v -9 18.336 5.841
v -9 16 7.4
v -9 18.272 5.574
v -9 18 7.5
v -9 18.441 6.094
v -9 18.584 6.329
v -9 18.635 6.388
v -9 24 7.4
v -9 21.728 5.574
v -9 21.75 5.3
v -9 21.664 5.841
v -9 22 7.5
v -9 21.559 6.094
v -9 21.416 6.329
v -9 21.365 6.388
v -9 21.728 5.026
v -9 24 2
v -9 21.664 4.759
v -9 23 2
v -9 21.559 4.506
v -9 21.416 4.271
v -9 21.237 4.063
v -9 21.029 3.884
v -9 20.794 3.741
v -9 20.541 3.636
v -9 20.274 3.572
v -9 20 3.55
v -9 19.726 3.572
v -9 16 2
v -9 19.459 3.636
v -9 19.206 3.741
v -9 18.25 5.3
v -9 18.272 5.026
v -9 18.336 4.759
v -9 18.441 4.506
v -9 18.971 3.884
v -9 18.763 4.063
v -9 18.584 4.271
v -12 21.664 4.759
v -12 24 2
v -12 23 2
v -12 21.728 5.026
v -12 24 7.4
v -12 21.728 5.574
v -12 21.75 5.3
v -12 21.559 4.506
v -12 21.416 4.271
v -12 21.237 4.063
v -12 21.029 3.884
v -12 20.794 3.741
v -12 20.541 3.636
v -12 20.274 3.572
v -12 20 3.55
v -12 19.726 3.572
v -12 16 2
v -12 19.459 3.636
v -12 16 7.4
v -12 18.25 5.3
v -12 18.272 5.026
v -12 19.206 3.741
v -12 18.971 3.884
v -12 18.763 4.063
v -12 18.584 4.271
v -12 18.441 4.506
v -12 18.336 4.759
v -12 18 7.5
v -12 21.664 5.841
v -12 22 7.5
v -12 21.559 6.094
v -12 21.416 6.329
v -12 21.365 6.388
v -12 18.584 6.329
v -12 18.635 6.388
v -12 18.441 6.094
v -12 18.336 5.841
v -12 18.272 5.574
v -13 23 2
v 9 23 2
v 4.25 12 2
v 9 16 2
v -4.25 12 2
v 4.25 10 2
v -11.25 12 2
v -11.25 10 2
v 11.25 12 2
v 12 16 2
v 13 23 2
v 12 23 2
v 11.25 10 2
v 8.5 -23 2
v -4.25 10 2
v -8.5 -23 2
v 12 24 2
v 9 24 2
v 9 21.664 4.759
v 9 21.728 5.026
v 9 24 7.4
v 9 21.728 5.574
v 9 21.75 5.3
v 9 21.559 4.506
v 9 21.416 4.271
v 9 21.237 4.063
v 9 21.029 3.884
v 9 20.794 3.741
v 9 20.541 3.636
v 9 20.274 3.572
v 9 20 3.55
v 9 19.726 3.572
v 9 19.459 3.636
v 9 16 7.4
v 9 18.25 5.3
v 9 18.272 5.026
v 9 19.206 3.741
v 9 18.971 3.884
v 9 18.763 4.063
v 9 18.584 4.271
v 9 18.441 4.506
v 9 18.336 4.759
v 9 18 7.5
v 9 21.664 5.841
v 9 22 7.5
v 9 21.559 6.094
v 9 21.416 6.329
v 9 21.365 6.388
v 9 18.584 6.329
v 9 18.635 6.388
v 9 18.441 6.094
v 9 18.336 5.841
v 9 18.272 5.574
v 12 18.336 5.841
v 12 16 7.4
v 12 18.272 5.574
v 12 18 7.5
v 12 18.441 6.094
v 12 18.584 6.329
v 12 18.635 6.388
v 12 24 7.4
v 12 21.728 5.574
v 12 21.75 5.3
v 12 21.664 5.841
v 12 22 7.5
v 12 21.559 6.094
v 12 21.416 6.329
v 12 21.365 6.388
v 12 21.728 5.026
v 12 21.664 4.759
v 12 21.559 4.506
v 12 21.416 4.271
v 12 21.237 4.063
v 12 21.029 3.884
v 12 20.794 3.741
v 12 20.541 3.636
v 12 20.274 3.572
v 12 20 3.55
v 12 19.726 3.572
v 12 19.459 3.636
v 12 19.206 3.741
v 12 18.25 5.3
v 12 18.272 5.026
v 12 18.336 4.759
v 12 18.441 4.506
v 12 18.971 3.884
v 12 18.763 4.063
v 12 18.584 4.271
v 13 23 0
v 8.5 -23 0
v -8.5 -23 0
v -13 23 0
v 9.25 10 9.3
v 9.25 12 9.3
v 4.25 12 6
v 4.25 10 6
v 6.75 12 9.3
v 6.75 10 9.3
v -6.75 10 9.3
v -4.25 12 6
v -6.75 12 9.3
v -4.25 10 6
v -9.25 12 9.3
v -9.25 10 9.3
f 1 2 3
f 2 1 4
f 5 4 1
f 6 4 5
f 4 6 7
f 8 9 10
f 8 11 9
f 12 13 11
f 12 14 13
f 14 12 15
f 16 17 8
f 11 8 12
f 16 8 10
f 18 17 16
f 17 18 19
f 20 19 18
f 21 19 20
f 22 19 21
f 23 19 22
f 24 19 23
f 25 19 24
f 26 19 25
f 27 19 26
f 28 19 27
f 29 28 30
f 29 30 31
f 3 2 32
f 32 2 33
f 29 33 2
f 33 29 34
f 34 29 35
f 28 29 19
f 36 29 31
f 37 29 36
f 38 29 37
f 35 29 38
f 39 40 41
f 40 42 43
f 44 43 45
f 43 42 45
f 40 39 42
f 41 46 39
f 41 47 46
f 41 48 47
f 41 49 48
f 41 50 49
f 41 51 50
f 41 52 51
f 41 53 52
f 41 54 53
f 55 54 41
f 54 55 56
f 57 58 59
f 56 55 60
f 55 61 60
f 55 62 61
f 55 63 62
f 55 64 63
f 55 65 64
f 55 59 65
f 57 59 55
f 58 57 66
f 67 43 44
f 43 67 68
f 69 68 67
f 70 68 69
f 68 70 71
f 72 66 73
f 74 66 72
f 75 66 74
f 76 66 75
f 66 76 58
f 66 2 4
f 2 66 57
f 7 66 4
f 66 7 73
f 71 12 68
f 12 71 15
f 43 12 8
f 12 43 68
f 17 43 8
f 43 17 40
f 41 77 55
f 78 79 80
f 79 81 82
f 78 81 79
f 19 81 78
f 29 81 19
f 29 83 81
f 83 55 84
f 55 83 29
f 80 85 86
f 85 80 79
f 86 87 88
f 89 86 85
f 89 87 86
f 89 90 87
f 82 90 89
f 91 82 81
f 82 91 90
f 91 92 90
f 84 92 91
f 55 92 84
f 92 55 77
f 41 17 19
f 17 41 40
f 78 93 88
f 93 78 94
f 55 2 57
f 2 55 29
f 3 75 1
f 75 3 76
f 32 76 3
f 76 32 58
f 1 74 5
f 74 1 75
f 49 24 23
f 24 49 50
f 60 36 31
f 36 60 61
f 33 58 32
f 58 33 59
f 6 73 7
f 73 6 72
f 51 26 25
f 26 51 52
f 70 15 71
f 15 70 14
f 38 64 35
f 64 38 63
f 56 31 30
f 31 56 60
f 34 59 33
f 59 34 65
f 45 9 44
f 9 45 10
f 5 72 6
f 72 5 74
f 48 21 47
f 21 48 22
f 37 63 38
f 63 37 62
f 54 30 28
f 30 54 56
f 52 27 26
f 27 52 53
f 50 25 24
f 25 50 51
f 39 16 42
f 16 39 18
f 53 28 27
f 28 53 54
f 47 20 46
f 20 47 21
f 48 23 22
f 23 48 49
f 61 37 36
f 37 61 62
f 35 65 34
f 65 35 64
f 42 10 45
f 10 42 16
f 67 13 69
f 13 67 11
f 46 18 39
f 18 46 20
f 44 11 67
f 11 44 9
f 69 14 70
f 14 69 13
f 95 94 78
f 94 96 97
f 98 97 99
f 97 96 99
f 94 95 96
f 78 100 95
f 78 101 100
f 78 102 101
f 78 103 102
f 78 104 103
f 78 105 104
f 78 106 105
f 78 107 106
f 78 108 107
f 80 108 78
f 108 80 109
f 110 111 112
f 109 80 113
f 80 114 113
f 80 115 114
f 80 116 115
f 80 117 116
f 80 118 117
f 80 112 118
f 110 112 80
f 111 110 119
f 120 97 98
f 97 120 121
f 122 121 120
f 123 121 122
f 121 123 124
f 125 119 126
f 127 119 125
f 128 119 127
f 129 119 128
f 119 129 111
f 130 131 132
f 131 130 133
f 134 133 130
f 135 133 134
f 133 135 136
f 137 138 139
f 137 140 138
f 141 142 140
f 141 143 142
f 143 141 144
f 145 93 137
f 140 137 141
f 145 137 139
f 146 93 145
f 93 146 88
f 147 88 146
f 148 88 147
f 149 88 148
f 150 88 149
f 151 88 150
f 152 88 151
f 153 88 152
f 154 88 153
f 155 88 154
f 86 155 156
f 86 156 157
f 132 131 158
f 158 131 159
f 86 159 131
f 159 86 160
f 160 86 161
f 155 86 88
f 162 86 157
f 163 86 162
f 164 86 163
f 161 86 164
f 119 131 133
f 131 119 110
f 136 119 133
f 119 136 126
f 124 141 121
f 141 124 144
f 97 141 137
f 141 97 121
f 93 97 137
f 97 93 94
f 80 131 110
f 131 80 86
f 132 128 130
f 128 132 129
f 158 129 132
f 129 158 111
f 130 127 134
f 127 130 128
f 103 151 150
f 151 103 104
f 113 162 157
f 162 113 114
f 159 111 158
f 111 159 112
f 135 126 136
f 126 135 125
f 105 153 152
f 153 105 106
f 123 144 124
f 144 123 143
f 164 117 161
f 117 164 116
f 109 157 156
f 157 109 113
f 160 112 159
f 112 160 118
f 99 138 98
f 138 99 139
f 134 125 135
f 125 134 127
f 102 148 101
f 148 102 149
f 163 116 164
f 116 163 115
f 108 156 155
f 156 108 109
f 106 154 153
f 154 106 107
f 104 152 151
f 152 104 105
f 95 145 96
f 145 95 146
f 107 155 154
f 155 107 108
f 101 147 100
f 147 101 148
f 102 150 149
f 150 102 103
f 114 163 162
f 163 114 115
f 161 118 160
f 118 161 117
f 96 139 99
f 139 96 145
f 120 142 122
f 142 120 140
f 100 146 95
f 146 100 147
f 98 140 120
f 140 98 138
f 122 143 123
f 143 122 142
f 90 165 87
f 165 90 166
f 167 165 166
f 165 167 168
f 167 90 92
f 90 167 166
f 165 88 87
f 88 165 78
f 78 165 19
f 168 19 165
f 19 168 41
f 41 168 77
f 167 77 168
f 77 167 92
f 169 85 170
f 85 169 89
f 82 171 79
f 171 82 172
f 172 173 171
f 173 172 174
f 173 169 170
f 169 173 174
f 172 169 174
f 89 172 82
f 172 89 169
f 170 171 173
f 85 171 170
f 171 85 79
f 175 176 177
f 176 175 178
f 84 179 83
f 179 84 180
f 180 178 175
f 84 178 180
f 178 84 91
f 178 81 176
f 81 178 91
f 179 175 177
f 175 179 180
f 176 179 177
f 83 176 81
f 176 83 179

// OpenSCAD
// Spare part for cookie maker from the 50s
// Print in PLA
// rotate([0,0,0])
$fn=40;

// 2 extrusions of the polygonish shapes
module polygonish() {
translate([0,35,2]) {
    rotate([90, 0, 0])
    translate([8.5/2, 0])
    linear_extrude(height=2)
    polygon(points = [[0, 0], [7, 0], [5, 7.3], [2.5, 7.3], [0, 4]]);
}
}

module grip() {
    rotate([0, -90, 0])
    translate([0, 0, 18/2])
    rotate([0, 0, -90])
    difference() {
    linear_extrude(height=3)
    polygon(points = [[-1, 0], [7, 0], [7, 5.4], [5, 5.5], [3, 2], [1, 5.5],[-1, 5.4]]);
    translate([3, 3.3, -0.5])
    cylinder(4, r=3.5/2);
    }
}

translate([0, -23, 0]) {

linear_extrude(height=2)
translate([0,0,2])
polygon(points = [[17/2, 0], [-17/2, 0], [-26/2, 46], [26/2, 46]]);


polygonish();
mirror() polygonish();


translate([0, 46, 2]) {
grip();
mirror() grip();
}
}
